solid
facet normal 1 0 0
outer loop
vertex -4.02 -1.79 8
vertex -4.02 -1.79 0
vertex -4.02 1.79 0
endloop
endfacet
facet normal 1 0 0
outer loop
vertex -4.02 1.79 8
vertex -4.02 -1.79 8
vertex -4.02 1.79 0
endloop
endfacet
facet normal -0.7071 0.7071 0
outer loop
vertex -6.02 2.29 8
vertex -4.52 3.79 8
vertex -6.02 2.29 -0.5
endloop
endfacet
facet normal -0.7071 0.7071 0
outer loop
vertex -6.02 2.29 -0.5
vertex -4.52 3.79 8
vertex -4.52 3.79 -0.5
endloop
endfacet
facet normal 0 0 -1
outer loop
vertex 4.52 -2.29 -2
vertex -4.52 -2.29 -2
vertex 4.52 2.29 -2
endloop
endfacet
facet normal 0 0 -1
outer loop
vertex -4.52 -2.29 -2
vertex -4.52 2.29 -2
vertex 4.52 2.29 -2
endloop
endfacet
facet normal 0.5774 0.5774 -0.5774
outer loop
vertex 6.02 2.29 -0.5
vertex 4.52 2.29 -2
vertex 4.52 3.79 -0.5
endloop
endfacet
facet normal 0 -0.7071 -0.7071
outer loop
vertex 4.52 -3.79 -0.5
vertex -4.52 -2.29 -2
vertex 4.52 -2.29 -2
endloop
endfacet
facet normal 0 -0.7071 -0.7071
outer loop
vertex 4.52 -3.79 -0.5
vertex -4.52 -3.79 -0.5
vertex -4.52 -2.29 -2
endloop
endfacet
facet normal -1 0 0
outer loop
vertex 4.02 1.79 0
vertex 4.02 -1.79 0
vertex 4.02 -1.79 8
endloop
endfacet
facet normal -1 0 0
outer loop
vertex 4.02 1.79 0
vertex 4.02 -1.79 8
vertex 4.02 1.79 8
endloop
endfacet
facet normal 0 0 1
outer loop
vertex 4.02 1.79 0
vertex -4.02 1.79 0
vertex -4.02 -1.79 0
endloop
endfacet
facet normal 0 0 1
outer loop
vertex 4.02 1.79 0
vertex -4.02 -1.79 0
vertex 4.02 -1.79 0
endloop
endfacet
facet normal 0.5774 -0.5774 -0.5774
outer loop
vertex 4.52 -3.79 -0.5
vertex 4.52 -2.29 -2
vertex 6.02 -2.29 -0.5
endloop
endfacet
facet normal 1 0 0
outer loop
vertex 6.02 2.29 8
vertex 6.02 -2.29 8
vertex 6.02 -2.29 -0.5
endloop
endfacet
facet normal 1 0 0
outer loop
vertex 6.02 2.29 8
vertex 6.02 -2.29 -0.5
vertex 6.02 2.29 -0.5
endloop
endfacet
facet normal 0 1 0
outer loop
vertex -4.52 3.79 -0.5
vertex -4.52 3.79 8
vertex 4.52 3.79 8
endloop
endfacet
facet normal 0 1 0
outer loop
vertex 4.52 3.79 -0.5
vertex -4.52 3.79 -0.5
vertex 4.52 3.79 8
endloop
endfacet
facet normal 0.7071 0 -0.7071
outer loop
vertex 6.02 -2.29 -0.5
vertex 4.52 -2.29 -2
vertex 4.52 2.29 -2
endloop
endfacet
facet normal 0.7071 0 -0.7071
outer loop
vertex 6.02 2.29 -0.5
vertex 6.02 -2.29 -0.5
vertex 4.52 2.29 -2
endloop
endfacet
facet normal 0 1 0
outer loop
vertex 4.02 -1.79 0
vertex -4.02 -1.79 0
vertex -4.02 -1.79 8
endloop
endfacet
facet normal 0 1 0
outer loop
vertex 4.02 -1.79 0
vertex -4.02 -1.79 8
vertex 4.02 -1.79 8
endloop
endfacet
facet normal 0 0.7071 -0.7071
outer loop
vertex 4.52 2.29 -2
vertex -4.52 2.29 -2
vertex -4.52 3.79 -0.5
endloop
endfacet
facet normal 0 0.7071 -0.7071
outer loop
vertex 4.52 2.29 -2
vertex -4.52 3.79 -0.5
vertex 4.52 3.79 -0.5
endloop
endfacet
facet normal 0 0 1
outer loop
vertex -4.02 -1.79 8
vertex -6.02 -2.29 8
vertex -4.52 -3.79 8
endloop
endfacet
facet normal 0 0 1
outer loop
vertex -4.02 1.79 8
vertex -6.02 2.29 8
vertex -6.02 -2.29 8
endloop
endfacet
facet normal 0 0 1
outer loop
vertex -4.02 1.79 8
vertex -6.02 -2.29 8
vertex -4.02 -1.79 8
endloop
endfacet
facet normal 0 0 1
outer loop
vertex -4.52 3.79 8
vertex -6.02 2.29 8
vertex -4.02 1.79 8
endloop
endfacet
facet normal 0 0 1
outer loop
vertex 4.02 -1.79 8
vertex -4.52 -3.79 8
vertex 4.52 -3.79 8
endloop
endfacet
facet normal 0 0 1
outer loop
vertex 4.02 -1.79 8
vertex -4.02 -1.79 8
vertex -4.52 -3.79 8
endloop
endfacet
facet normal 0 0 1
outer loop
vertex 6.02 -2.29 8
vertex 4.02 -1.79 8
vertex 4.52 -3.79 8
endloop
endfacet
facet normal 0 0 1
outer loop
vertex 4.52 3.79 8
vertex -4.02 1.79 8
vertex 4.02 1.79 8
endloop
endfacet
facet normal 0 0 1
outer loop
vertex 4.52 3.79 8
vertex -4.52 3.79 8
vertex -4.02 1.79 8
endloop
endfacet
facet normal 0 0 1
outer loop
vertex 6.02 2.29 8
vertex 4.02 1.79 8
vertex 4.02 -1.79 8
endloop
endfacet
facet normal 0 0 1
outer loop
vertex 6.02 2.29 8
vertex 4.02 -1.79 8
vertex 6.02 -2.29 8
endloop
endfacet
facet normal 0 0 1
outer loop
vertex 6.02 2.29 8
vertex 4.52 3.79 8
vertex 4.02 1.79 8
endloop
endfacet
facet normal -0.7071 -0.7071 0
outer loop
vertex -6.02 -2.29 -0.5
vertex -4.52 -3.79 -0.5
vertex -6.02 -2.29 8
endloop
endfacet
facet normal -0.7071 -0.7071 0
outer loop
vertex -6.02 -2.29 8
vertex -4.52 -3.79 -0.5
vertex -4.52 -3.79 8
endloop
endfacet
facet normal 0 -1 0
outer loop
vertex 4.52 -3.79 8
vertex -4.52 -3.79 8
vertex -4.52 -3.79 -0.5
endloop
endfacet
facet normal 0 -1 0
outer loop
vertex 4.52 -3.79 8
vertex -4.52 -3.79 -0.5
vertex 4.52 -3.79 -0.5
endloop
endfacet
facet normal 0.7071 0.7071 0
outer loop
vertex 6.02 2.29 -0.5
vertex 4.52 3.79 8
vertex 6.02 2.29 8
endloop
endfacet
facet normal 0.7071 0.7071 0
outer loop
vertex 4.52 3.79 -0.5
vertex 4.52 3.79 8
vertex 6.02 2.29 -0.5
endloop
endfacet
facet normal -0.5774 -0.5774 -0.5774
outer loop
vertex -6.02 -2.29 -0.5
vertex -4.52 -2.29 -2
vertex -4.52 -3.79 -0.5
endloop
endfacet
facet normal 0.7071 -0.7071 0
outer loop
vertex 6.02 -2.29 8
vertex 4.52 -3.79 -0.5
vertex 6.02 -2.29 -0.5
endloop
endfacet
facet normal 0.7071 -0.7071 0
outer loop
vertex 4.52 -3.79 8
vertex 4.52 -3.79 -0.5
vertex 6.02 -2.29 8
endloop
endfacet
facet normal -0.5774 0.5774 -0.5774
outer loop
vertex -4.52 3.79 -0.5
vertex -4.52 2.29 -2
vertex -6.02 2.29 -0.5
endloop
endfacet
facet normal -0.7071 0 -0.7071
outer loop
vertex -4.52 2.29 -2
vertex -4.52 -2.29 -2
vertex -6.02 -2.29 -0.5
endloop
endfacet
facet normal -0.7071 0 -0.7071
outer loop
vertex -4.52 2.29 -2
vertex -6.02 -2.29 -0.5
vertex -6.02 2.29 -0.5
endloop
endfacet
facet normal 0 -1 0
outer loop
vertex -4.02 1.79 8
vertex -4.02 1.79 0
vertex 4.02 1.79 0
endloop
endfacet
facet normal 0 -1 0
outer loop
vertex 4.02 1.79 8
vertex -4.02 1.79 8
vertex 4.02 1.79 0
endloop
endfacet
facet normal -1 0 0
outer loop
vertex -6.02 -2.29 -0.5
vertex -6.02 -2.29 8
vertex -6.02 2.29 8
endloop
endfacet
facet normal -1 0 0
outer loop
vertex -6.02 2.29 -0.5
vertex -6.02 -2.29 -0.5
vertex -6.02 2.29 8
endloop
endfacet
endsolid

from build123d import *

# Parameters (mm, degrees)
SKETCH1_W           = 12.04
SKETCH1_H           = 7.58
SKETCH1_W_2         = 8.04
SKETCH1_H_2         = 3.58
BOSS_EXTRUDE1_DEPTH = 8
SKETCH1_2_W         = 12.04
SKETCH1_2_H         = 7.58
SKETCH1_2_W_2       = 8.04
SKETCH1_2_H_2       = 3.58
BOSS_EXTRUDE2_DEPTH = 2
CHAMFER1_SIZE       = 1.5


with BuildPart() as part:
    # Sketch1 → Boss-Extrude1 (new body)
    with BuildSketch(Plane.XY):
        Rectangle(SKETCH1_W, SKETCH1_H)
        Rectangle(SKETCH1_W_2, SKETCH1_H_2, mode=Mode.SUBTRACT)
    extrude(amount=BOSS_EXTRUDE1_DEPTH)

    # Sketch1<2> → Boss-Extrude2 (add)
    # profile 1 of 2: a face of its own
    with BuildSketch(Plane.XY):
        Rectangle(SKETCH1_2_W, SKETCH1_2_H)
        Rectangle(SKETCH1_2_W_2, SKETCH1_2_H_2, mode=Mode.SUBTRACT)
    # profile 2 of 2: a face of its own
    with BuildSketch(Plane.XY):
        Rectangle(SKETCH1_2_W_2, SKETCH1_2_H_2)
    extrude(amount=-BOSS_EXTRUDE2_DEPTH)

    # Chamfer1
    chamfer1_edges = [part.edges().sort_by_distance(p)[0] for p in [
        (0, -3.79, -2),
        (-6.02, 0, -2),
        (6.02, 0, -2),
        (0, 3.79, -2),
        (6.02, -3.79, 3),
        (-6.02, -3.79, 3),
        (-6.02, 3.79, 3),
        (6.02, 3.79, 3),
    ]]
    chamfer(chamfer1_edges, length=CHAMFER1_SIZE)


solid = part.part
